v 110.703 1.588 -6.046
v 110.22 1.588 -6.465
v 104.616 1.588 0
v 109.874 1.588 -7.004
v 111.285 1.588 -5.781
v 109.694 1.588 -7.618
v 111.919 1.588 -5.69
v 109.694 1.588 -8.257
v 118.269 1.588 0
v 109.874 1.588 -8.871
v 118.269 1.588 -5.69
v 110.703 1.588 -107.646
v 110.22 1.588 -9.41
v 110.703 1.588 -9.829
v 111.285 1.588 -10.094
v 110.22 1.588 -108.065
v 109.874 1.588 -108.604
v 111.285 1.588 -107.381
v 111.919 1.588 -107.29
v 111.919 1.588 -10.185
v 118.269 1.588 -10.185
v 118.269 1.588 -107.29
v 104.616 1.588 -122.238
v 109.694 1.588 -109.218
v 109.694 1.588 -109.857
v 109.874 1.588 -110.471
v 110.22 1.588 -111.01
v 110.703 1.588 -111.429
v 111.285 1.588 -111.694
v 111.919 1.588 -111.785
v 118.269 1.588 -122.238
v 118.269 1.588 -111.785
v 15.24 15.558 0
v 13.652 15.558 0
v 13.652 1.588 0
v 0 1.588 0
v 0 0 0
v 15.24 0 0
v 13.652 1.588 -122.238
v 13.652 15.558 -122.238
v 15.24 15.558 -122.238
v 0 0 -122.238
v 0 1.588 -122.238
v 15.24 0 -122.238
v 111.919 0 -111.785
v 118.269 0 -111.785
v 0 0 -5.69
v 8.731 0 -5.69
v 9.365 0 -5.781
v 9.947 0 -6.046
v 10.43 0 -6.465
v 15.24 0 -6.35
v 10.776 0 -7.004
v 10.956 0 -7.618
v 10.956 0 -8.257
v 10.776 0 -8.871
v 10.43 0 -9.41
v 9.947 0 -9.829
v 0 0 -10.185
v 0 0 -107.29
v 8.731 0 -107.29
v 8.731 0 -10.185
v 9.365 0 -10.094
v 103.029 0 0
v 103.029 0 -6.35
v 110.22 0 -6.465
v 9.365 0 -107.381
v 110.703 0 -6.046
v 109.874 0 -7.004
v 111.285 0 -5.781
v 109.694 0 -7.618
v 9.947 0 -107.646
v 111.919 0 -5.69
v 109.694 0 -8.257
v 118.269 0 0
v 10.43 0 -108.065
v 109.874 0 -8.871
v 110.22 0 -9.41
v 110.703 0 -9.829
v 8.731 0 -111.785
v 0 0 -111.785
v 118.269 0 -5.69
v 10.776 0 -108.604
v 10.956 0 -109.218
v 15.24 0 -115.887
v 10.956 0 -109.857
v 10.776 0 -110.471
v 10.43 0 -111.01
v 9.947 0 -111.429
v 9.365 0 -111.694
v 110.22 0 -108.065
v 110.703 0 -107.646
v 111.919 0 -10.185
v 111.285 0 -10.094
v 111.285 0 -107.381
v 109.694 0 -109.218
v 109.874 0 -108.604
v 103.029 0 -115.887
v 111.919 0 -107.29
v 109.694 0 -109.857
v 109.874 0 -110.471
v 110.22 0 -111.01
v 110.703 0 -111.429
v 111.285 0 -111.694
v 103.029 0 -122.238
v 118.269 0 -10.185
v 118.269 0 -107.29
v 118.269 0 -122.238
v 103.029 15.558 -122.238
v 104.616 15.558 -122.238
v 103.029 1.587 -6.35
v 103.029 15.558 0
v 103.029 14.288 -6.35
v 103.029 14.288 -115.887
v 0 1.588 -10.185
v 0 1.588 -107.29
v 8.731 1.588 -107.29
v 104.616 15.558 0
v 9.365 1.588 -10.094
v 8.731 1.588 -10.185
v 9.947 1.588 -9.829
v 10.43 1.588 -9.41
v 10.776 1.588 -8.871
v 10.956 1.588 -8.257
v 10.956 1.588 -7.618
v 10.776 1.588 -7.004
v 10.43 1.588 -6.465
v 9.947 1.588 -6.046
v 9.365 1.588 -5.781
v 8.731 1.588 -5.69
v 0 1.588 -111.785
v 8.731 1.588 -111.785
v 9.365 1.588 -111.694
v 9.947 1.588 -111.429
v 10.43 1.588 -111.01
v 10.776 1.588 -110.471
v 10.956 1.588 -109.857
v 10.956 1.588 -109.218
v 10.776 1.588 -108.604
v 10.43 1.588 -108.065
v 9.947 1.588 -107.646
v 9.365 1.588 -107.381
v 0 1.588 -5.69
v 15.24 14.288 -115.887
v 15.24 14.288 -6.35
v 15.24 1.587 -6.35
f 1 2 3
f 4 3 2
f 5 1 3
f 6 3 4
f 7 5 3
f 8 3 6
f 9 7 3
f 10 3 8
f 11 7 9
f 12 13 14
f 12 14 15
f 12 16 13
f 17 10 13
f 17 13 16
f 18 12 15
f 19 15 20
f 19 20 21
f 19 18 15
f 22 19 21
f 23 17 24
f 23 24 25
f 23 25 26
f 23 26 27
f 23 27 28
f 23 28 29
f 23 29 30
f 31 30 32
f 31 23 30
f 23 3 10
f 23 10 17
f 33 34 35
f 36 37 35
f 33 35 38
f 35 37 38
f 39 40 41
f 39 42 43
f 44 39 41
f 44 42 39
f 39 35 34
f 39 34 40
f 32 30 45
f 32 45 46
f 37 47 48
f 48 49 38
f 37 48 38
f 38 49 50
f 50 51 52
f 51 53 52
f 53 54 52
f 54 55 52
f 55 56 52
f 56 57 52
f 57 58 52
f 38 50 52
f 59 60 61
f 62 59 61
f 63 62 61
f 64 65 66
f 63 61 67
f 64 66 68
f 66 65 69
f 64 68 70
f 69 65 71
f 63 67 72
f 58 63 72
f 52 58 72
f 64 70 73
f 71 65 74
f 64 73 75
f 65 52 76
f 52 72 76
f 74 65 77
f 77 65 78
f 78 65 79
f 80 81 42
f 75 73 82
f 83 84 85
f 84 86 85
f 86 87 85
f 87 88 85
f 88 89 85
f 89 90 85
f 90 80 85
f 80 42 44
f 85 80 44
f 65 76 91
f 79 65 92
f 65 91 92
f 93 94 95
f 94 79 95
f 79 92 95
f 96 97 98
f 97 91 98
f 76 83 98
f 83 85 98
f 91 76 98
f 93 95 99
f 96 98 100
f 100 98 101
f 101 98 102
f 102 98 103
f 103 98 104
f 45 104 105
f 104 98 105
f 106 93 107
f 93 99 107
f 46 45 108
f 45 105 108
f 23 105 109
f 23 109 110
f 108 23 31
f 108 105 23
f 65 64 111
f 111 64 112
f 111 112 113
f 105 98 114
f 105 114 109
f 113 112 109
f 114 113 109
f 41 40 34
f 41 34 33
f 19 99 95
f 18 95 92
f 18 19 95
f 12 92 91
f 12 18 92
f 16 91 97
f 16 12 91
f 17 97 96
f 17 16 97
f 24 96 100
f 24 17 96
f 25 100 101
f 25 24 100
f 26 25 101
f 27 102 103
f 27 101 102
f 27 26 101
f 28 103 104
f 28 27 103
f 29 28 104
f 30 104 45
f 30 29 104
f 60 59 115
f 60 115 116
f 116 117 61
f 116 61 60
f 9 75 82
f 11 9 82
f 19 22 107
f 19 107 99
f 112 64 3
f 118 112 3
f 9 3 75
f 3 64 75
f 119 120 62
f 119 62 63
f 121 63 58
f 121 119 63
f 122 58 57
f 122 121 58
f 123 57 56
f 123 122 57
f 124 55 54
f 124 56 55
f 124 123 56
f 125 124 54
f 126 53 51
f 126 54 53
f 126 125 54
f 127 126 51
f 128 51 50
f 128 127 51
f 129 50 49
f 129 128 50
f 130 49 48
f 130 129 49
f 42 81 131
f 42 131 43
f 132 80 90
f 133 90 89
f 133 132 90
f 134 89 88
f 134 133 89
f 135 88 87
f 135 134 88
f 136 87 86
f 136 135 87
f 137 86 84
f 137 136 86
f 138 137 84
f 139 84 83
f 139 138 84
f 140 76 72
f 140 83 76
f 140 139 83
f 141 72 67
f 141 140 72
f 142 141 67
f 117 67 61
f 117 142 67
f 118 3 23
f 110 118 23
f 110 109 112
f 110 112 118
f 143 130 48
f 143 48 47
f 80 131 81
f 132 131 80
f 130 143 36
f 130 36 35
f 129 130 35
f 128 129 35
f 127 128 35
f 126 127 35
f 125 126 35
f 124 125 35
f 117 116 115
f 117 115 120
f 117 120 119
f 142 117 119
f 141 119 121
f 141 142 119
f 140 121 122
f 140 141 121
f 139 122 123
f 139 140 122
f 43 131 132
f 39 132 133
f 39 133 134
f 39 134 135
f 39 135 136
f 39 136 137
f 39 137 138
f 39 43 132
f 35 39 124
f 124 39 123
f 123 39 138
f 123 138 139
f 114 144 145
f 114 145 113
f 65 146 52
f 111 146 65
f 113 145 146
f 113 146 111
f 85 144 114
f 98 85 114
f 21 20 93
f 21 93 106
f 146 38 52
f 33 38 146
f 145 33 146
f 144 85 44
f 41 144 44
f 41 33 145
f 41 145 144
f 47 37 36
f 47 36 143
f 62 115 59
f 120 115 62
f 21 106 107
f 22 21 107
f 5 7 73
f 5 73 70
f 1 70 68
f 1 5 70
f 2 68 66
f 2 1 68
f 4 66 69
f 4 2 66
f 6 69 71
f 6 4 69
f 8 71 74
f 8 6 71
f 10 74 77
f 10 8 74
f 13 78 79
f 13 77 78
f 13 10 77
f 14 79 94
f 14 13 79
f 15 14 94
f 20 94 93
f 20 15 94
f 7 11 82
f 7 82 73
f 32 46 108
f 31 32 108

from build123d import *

# Parameters (mm, degrees)
SKETCH2_W           = 118.26875
SKETCH2_H           = 122.2375
BOSS_EXTRUDE1_DEPTH = 1.5875
SKETCH3_W           = 87.78875
SKETCH3_H           = 109.5375
BOSS_EXTRUDE2_DEPTH = 12.7
SKETCH4_W           = 1.5875
SKETCH4_H           = 122.2375
BOSS_EXTRUDE3_DEPTH = 13.97
SKETCH5_W           = 87.78875
SKETCH5_H           = 9.551675444
SKETCH5_H_2         = 9.580916999
CUT_EXTRUDE1_DEPTH  = 2.5875


with BuildPart() as part:
    # Sketch2 → Boss-Extrude1 (new body)
    with BuildSketch(Plane(origin=(0, 0, 0), x_dir=(1, 0, 0), z_dir=(0, 1, 0))):
        with Locations((59.134375, 61.11875)):
            Rectangle(SKETCH2_W, SKETCH2_H)
    extrude(amount=BOSS_EXTRUDE1_DEPTH)

    # Sketch3 → Boss-Extrude2 (add)
    with BuildSketch(Plane(origin=(0, 1.5875, 0), x_dir=(1, 0, 0), z_dir=(0, 1, 0))):
        with Locations((59.134375, 61.11875)):
            Rectangle(SKETCH3_W, SKETCH3_H)
    extrude(amount=BOSS_EXTRUDE2_DEPTH)

    # Sketch4 → Boss-Extrude3 (add)
    with BuildSketch(Plane(origin=(0, 1.5875, 0), x_dir=(1, 0, 0), z_dir=(0, 1, 0))):
        with Locations((14.44625, 61.11875)):
            Rectangle(SKETCH4_W, SKETCH4_H)
        with Locations((103.8225, 61.11875)):
            Rectangle(SKETCH4_W, SKETCH4_H)
    extrude(amount=BOSS_EXTRUDE3_DEPTH)

    # Sketch5 → Cut-Extrude1 (cut, through all)
    with BuildSketch(Plane(origin=(0, 1.5875, 0), x_dir=(1, 0, 0), z_dir=(0, 1, 0))):
        with BuildLine():
            Line((-8.73125, 111.7854), (8.73125, 111.7854))
            ThreePointArc((8.73125, 111.7854), (10.97915, 109.5375), (8.73125, 107.2896))
            Line((8.73125, 107.2896), (-8.73125, 107.2896))
            ThreePointArc((-8.73125, 107.2896), (-10.97915, 109.5375), (-8.73125, 111.7854))
        make_face()
        with BuildLine():
            Line((111.91875, 111.7854), (129.38125, 111.7854))
            ThreePointArc((129.38125, 111.7854), (131.62915, 109.5375), (129.38125, 107.2896))
            Line((129.38125, 107.2896), (111.91875, 107.2896))
            ThreePointArc((111.91875, 107.2896), (109.67085, 109.5375), (111.91875, 111.7854))
        make_face()
        with BuildLine():
            Line((111.91875, 10.1854), (129.38125, 10.1854))
            ThreePointArc((129.38125, 10.1854), (131.62915, 7.9375), (129.38125, 5.6896))
            Line((129.38125, 5.6896), (111.91875, 5.6896))
            ThreePointArc((111.91875, 5.6896), (109.67085, 7.9375), (111.91875, 10.1854))
        make_face()
        with BuildLine():
            Line((-8.73125, 10.1854), (8.73125, 10.1854))
            ThreePointArc((8.73125, 10.1854), (10.97915, 7.9375), (8.73125, 5.6896))
            Line((8.73125, 5.6896), (-8.73125, 5.6896))
            ThreePointArc((-8.73125, 5.6896), (-10.97915, 7.9375), (-8.73125, 10.1854))
        make_face()
        with Locations((59.134375, 120.663337722)):
            Rectangle(SKETCH5_W, SKETCH5_H)
        with Locations((59.134375, 1.559541501)):
            Rectangle(SKETCH5_W, SKETCH5_H_2)
    extrude(amount=-CUT_EXTRUDE1_DEPTH, mode=Mode.SUBTRACT)


solid = part.part
